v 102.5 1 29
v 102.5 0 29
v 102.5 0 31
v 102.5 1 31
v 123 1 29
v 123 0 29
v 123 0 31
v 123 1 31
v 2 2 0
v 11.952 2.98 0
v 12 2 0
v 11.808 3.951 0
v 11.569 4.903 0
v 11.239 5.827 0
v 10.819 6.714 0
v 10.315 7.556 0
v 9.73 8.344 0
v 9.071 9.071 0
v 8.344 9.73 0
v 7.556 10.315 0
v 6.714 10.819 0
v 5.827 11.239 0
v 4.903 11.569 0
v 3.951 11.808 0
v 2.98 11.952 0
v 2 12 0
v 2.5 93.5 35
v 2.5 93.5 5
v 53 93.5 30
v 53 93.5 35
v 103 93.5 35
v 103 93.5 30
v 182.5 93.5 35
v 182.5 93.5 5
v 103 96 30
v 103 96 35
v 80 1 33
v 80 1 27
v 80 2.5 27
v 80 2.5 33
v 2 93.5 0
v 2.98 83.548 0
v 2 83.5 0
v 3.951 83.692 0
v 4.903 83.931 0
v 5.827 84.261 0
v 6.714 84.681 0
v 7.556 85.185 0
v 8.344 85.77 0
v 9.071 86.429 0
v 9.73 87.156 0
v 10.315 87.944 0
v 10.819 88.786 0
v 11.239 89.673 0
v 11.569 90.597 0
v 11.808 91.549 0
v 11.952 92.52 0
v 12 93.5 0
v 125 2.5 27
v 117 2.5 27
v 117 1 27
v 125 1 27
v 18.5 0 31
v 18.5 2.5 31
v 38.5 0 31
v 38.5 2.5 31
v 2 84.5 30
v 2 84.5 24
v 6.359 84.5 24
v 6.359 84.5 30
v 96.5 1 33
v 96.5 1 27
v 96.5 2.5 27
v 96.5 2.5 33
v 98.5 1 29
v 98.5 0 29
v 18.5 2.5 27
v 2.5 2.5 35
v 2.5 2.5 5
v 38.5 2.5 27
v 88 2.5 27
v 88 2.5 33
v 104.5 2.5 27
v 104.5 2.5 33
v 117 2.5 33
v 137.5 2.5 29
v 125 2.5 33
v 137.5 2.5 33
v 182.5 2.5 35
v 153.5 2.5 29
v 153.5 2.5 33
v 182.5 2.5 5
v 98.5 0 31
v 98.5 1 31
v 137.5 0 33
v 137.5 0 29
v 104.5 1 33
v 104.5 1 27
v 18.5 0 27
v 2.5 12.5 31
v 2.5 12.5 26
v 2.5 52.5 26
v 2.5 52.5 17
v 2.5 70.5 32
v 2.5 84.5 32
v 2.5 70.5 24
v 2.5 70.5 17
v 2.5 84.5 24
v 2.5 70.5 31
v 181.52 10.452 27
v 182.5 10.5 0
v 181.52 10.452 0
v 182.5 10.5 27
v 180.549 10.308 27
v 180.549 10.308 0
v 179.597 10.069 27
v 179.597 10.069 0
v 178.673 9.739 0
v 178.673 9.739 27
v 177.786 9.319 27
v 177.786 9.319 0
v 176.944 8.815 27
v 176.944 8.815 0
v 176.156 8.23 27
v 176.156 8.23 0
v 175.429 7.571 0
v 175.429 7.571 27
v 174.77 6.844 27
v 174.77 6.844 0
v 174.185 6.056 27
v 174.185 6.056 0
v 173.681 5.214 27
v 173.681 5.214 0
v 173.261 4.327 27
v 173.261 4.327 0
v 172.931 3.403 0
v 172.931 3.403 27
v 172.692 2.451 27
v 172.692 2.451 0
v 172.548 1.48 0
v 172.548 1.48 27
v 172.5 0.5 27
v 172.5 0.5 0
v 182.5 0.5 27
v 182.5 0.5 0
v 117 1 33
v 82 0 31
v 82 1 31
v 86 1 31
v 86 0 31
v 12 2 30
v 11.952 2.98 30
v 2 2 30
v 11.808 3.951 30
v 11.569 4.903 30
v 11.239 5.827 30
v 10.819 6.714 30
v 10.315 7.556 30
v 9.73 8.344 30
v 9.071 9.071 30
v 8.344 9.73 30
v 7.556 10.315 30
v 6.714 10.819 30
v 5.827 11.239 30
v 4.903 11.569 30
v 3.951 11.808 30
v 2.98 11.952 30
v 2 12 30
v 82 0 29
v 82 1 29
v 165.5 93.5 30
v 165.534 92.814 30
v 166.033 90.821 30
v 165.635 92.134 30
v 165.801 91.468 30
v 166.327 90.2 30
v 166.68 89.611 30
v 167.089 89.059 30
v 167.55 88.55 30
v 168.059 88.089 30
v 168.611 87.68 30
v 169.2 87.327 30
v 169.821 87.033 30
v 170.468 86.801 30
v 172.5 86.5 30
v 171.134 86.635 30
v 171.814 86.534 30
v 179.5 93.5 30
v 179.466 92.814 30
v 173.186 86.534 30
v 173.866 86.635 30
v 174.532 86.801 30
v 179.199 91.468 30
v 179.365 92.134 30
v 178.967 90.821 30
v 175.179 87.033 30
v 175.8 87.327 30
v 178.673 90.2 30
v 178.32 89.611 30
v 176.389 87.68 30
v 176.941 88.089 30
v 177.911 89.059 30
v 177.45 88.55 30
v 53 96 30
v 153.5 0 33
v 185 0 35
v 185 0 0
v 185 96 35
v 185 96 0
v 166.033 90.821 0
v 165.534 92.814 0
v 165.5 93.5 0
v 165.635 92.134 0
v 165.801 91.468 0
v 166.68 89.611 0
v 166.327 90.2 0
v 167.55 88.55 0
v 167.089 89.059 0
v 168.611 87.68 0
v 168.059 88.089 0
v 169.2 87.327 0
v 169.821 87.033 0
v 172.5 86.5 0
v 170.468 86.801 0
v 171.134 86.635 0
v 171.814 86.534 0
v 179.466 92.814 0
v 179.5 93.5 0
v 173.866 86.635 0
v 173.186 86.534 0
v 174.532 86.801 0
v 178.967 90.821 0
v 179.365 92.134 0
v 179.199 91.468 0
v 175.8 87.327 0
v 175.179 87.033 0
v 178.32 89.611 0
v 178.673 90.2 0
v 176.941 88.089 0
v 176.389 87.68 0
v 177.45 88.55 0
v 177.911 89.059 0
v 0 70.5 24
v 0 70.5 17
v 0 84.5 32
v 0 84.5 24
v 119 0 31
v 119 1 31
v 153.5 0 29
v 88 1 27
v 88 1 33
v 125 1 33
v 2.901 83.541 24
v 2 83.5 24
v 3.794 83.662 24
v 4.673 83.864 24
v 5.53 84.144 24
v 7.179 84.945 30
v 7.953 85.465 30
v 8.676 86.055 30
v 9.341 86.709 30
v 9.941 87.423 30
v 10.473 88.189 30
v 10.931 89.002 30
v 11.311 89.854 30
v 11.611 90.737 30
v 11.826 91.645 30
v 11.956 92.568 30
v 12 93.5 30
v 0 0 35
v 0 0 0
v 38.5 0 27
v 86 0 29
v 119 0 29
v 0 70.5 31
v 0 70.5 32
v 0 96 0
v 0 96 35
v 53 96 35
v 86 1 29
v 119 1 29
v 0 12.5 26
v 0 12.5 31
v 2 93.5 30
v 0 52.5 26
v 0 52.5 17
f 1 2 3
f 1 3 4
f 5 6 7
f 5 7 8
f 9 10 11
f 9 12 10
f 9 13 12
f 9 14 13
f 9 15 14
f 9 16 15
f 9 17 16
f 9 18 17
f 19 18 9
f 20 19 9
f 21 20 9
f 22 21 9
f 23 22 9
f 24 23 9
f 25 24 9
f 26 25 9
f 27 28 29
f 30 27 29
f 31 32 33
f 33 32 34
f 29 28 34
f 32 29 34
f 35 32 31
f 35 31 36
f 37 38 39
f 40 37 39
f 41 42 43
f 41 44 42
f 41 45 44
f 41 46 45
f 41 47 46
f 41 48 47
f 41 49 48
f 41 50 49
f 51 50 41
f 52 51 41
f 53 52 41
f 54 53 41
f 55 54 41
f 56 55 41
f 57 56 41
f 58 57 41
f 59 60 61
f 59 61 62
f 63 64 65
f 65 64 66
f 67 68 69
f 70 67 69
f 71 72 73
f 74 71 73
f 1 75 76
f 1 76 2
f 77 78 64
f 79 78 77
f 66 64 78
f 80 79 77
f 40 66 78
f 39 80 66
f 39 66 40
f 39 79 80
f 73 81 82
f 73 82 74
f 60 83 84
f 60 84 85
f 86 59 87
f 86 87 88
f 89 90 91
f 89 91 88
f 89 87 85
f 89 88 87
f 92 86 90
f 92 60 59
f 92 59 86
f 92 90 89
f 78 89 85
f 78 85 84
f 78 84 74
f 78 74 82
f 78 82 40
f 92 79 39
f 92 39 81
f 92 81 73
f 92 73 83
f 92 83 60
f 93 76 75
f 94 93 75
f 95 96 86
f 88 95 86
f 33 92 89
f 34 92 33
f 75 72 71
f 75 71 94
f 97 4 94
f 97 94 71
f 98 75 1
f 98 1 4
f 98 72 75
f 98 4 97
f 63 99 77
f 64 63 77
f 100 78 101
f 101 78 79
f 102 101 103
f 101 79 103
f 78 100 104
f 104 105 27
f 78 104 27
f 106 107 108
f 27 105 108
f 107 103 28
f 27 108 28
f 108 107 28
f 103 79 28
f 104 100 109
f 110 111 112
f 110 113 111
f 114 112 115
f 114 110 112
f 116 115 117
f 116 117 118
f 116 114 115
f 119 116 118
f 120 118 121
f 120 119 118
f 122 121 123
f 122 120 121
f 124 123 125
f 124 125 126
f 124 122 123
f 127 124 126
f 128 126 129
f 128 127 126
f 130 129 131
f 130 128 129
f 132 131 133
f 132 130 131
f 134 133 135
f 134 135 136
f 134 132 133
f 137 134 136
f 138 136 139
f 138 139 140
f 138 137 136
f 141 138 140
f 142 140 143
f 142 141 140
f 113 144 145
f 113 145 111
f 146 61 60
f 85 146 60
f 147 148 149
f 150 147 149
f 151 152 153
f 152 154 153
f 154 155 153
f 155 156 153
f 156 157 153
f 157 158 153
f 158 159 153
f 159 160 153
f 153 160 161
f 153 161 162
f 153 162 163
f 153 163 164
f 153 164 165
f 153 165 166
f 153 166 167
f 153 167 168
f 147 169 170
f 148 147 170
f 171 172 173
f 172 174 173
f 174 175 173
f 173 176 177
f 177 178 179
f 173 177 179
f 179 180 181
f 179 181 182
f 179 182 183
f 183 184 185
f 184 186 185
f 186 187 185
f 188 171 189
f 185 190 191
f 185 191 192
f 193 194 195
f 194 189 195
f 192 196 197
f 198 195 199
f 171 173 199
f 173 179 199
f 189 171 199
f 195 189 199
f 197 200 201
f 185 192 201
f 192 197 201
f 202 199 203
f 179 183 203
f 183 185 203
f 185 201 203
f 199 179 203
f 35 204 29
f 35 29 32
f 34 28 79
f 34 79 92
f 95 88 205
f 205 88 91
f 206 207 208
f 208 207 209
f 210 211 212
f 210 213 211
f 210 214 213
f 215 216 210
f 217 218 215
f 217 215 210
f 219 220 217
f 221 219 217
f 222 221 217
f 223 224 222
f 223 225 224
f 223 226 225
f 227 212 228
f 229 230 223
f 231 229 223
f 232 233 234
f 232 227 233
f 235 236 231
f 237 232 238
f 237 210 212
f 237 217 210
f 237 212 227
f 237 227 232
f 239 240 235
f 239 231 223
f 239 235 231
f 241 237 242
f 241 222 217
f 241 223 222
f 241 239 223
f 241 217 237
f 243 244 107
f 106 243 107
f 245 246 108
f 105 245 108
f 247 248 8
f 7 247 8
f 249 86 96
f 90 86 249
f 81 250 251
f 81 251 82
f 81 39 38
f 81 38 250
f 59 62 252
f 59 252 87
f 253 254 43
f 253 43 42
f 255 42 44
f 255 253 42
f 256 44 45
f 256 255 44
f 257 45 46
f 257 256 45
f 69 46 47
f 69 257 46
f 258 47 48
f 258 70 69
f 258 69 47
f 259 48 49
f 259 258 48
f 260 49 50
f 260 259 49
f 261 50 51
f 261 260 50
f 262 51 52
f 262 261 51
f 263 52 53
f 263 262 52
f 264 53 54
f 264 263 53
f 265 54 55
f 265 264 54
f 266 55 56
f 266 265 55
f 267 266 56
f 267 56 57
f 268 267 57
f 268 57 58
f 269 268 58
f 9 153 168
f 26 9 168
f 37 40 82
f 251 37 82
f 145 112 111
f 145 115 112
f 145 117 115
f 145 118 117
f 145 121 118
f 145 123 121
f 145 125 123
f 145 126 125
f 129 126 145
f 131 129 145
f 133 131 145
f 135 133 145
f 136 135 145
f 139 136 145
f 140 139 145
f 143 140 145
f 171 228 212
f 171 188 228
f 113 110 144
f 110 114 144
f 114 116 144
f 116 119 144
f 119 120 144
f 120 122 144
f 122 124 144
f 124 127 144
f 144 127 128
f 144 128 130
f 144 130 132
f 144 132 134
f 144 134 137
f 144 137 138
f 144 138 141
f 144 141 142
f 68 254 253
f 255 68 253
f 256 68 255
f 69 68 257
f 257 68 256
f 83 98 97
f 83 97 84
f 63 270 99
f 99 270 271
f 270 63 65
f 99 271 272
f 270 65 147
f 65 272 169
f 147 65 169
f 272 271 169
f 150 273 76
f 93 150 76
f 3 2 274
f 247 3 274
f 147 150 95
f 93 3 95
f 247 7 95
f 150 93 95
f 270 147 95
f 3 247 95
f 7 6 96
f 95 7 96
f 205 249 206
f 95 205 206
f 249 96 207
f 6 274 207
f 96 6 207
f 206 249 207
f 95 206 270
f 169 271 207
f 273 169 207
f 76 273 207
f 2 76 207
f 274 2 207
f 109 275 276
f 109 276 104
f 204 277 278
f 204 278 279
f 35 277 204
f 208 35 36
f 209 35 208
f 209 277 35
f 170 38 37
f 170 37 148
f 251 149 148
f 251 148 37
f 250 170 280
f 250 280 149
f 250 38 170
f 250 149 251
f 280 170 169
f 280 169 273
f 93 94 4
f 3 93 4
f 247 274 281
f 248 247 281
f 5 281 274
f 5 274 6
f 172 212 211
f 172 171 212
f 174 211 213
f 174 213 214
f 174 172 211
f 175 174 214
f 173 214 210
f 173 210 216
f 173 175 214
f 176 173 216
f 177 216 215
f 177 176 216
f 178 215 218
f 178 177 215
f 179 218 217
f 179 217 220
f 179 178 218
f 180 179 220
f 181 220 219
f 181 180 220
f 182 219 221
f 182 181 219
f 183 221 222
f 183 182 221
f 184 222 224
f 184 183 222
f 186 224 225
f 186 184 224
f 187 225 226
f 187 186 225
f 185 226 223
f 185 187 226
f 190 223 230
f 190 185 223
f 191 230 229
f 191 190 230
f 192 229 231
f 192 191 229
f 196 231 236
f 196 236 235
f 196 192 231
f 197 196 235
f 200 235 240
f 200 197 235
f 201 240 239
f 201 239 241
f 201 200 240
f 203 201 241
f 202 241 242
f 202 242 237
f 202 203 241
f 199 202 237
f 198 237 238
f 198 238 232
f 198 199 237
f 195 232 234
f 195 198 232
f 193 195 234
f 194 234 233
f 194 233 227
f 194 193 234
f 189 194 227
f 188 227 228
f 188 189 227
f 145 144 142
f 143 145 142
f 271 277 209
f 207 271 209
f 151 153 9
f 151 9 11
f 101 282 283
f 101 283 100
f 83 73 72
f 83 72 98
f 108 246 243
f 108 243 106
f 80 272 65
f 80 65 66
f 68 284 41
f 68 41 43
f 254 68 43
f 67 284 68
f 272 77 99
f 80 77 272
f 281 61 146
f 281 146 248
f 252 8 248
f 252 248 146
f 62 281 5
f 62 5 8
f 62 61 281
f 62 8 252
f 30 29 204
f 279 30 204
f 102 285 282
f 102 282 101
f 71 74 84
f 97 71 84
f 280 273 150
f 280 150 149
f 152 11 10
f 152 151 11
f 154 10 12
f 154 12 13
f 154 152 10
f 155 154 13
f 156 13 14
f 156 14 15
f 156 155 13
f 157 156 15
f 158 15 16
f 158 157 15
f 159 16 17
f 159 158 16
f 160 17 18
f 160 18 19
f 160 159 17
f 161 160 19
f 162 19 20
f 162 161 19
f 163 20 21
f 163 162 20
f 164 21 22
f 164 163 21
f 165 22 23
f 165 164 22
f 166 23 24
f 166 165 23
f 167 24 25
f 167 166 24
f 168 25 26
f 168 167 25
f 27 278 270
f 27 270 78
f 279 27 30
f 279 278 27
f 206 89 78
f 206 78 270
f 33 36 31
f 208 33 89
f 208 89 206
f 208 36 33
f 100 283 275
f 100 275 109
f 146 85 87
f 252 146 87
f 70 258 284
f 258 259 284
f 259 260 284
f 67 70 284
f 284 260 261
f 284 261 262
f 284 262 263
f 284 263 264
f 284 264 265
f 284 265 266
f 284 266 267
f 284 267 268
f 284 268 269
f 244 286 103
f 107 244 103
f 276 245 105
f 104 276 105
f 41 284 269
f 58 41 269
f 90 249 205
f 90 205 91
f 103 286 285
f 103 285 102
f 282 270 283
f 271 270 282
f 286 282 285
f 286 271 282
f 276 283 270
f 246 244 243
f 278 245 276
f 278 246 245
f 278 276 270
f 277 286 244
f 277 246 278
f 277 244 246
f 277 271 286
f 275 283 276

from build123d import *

# Parameters (mm, degrees)
CYLINDER_W                  = 10
CYLINDER_H                  = 30
CYLINDER_ANGLE              = 90
CYLINDER002_W               = 7
CYLINDER002_H               = 30
CYLINDER002_ANGLE           = 180
CYLINDER003_W               = 10
CYLINDER003_H               = 27
CYLINDER003_ANGLE           = 90
CYLINDER003_PLACEMENT_ANGLE = 90
BOX012_W                    = 8
BOX012_H                    = 2
BOX012_DEPTH                = 6
BOX011_W                    = 8
BOX011_H                    = 2
BOX011_DEPTH                = 6
BOX013_W                    = 8
BOX013_H                    = 2
BOX013_DEPTH                = 6
BOX008_W                    = 4
BOX008_H                    = 4
BOX008_DEPTH                = 2
BOX009_W                    = 4
BOX009_H                    = 4
BOX009_DEPTH                = 2
BOX007_W                    = 4
BOX007_H                    = 4
BOX007_DEPTH                = 2
BOX006_W                    = 20
BOX006_H                    = 10
BOX006_DEPTH                = 4
BOX005_W                    = 50
BOX005_H                    = 10
BOX005_DEPTH                = 5
BOX004_W                    = 10
BOX004_H                    = 42
BOX004_DEPTH                = 5
BOX003_W                    = 10
BOX003_H                    = 18
BOX003_DEPTH                = 14
BOX002_W                    = 10
BOX002_H                    = 14
BOX002_DEPTH                = 8
BOX010_W                    = 16
BOX010_H                    = 10
BOX010_DEPTH                = 4
BOX001_W                    = 180
BOX001_H                    = 91
BOX001_DEPTH                = 30
BOX_W                       = 185
BOX_H                       = 96
BOX_DEPTH                   = 35
CYLINDER001_W               = 10
CYLINDER001_H               = 30
CYLINDER001_ANGLE           = 90
CYLINDER001_PLACEMENT_ANGLE = -90


with BuildPart() as standoffbr:
    # Cylinder → Cylinder (revolve)
    with BuildSketch(Plane(origin=(2, 2, 0), x_dir=(1, 0, 0), z_dir=(0, -1, 0))):
        with Locations((5, 15)):
            Rectangle(CYLINDER_W, CYLINDER_H)
    revolve(axis=Axis((2, 2, 0), (0, 0, 1)), revolution_arc=CYLINDER_ANGLE)


with BuildPart() as standofftl:
    # Cylinder002 → Cylinder002 (revolve)
    with BuildSketch(Plane(origin=(172.5, 93.5, 0), x_dir=(-1, 0, 0), z_dir=(0, 1, 0))):
        with Locations((3.5, 15)):
            Rectangle(CYLINDER002_W, CYLINDER002_H)
    revolve(axis=Axis((172.5, 93.5, 0), (0, 0, 1)), revolution_arc=CYLINDER002_ANGLE)


with BuildPart() as standofftr:
    # Cylinder003 → Cylinder003 (revolve)
    with BuildSketch(Plane.XZ):
        with Locations((5, 13.5)):
            Rectangle(CYLINDER003_W, CYLINDER003_H)
    revolve(axis=Axis((0, 0, 0), (0, 0, 1)), revolution_arc=CYLINDER003_ANGLE)


with BuildPart() as standofftr_1:
    # Cylinder003 placement: moved
    add(standofftr.part.moved(Location((182.5, 0.5, 0))).rotate(Axis((182.5, 0.5, 0), (0, 0, 1)), CYLINDER003_PLACEMENT_ANGLE))


with BuildPart() as volumeupbotton:
    # Box012 → Box012 (new body)
    with BuildSketch(Plane(origin=(96.5, 1, 27), x_dir=(1, 0, 0), z_dir=(0, 0, 1))):
        with Locations((4, 1)):
            Rectangle(BOX012_W, BOX012_H)
    extrude(amount=BOX012_DEPTH)


with BuildPart() as voldownbutton:
    # Box011 → Box011 (new body)
    with BuildSketch(Plane(origin=(80, 1, 27), x_dir=(1, 0, 0), z_dir=(0, 0, 1))):
        with Locations((4, 1)):
            Rectangle(BOX011_W, BOX011_H)
    extrude(amount=BOX011_DEPTH)


with BuildPart() as buttoncutouts:
    # Box013 → Box013 (new body)
    with BuildSketch(Plane(origin=(117, 1, 27), x_dir=(1, 0, 0), z_dir=(0, 0, 1))):
        with Locations((4, 1)):
            Rectangle(BOX013_W, BOX013_H)
    extrude(amount=BOX013_DEPTH)

    # Fusion001: union VolumeUpBotton, VolDownButton
    add(volumeupbotton.part)
    add(voldownbutton.part)


with BuildPart() as volup:
    # Box008 → Box008 (new body)
    with BuildSketch(Plane(origin=(98.5, -2, 29), x_dir=(1, 0, 0), z_dir=(0, 0, 1))):
        with Locations((2, 2)):
            Rectangle(BOX008_W, BOX008_H)
    extrude(amount=BOX008_DEPTH)


with BuildPart() as power:
    # Box009 → Box009 (new body)
    with BuildSketch(Plane(origin=(119, -2, 29), x_dir=(1, 0, 0), z_dir=(0, 0, 1))):
        with Locations((2, 2)):
            Rectangle(BOX009_W, BOX009_H)
    extrude(amount=BOX009_DEPTH)


with BuildPart() as voldown:
    # Box007 → Box007 (new body)
    with BuildSketch(Plane(origin=(82, -2, 29), x_dir=(1, 0, 0), z_dir=(0, 0, 1))):
        with Locations((2, 2)):
            Rectangle(BOX007_W, BOX007_H)
    extrude(amount=BOX007_DEPTH)


with BuildPart() as smartcard:
    # Box006 → Box006 (new body)
    with BuildSketch(Plane(origin=(18.5, -1, 27), x_dir=(1, 0, 0), z_dir=(0, 0, 1))):
        with Locations((10, 5)):
            Rectangle(BOX006_W, BOX006_H)
    extrude(amount=BOX006_DEPTH)


with BuildPart() as hwswitches:
    # Box005 → Box005 (new body)
    with BuildSketch(Plane(origin=(53, 87, 30), x_dir=(1, 0, 0), z_dir=(0, 0, 1))):
        with Locations((25, 5)):
            Rectangle(BOX005_W, BOX005_H)
    extrude(amount=BOX005_DEPTH)


with BuildPart() as ports:
    # Box004 → Box004 (new body)
    with BuildSketch(Plane(origin=(-1, 12.5, 26), x_dir=(1, 0, 0), z_dir=(0, 0, 1))):
        with Locations((5, 21)):
            Rectangle(BOX004_W, BOX004_H)
    extrude(amount=BOX004_DEPTH)


with BuildPart() as rj45:
    # Box003 → Box003 (new body)
    with BuildSketch(Plane(origin=(-1, 52.5, 17), x_dir=(1, 0, 0), z_dir=(0, 0, 1))):
        with Locations((5, 9)):
            Rectangle(BOX003_W, BOX003_H)
    extrude(amount=BOX003_DEPTH)


with BuildPart() as headphone:
    # Box002 → Box002 (new body)
    with BuildSketch(Plane(origin=(-1, 70.5, 24), x_dir=(1, 0, 0), z_dir=(0, 0, 1))):
        with Locations((5, 7)):
            Rectangle(BOX002_W, BOX002_H)
    extrude(amount=BOX002_DEPTH)


with BuildPart() as allcutouts:
    # Box010 → Box010 (new body)
    with BuildSketch(Plane(origin=(137.5, -1, 29), x_dir=(1, 0, 0), z_dir=(0, 0, 1))):
        with Locations((8, 5)):
            Rectangle(BOX010_W, BOX010_H)
    extrude(amount=BOX010_DEPTH)

    # Fusion: union VolUp, Power, VolDown, SmartCard, HWSwitches, Ports, RJ45, Headphone
    add(volup.part)
    add(power.part)
    add(voldown.part)
    add(smartcard.part)
    add(hwswitches.part)
    add(ports.part)
    add(rj45.part)
    add(headphone.part)


with BuildPart() as inside:
    # Box001 → Box001 (new body)
    with BuildSketch(Plane(origin=(2.5, 2.5, 5), x_dir=(1, 0, 0), z_dir=(0, 0, 1))):
        with Locations((90, 45.5)):
            Rectangle(BOX001_W, BOX001_H)
    extrude(amount=BOX001_DEPTH)


with BuildPart() as shell001:
    # Box → Box (new body)
    with BuildSketch(Plane.XY):
        with Locations((92.5, 48)):
            Rectangle(BOX_W, BOX_H)
    extrude(amount=BOX_DEPTH)

    # Cut: cut Inside
    add(inside.part, mode=Mode.SUBTRACT)

    # Cut001: cut AllCutouts
    add(allcutouts.part, mode=Mode.SUBTRACT)

    # Cut002: cut ButtonCutouts
    add(buttoncutouts.part, mode=Mode.SUBTRACT)


with BuildPart() as standoffbl:
    # Cylinder001 → Cylinder001 (revolve)
    with BuildSketch(Plane.XZ):
        with Locations((5, 15)):
            Rectangle(CYLINDER001_W, CYLINDER001_H)
    revolve(axis=Axis((0, 0, 0), (0, 0, 1)), revolution_arc=CYLINDER001_ANGLE)


with BuildPart() as standoffbl_1:
    # Cylinder001 placement: moved
    add(standoffbl.part.moved(Location((2, 93.5, 0))).rotate(Axis((2, 93.5, 0), (0, 0, 1)), CYLINDER001_PLACEMENT_ANGLE))

    # Cut003: cut Headphone
    add(headphone.part, mode=Mode.SUBTRACT)


solid = Compound([standoffbr.part, standofftl.part, standofftr_1.part, shell001.part, standoffbl_1.part])
